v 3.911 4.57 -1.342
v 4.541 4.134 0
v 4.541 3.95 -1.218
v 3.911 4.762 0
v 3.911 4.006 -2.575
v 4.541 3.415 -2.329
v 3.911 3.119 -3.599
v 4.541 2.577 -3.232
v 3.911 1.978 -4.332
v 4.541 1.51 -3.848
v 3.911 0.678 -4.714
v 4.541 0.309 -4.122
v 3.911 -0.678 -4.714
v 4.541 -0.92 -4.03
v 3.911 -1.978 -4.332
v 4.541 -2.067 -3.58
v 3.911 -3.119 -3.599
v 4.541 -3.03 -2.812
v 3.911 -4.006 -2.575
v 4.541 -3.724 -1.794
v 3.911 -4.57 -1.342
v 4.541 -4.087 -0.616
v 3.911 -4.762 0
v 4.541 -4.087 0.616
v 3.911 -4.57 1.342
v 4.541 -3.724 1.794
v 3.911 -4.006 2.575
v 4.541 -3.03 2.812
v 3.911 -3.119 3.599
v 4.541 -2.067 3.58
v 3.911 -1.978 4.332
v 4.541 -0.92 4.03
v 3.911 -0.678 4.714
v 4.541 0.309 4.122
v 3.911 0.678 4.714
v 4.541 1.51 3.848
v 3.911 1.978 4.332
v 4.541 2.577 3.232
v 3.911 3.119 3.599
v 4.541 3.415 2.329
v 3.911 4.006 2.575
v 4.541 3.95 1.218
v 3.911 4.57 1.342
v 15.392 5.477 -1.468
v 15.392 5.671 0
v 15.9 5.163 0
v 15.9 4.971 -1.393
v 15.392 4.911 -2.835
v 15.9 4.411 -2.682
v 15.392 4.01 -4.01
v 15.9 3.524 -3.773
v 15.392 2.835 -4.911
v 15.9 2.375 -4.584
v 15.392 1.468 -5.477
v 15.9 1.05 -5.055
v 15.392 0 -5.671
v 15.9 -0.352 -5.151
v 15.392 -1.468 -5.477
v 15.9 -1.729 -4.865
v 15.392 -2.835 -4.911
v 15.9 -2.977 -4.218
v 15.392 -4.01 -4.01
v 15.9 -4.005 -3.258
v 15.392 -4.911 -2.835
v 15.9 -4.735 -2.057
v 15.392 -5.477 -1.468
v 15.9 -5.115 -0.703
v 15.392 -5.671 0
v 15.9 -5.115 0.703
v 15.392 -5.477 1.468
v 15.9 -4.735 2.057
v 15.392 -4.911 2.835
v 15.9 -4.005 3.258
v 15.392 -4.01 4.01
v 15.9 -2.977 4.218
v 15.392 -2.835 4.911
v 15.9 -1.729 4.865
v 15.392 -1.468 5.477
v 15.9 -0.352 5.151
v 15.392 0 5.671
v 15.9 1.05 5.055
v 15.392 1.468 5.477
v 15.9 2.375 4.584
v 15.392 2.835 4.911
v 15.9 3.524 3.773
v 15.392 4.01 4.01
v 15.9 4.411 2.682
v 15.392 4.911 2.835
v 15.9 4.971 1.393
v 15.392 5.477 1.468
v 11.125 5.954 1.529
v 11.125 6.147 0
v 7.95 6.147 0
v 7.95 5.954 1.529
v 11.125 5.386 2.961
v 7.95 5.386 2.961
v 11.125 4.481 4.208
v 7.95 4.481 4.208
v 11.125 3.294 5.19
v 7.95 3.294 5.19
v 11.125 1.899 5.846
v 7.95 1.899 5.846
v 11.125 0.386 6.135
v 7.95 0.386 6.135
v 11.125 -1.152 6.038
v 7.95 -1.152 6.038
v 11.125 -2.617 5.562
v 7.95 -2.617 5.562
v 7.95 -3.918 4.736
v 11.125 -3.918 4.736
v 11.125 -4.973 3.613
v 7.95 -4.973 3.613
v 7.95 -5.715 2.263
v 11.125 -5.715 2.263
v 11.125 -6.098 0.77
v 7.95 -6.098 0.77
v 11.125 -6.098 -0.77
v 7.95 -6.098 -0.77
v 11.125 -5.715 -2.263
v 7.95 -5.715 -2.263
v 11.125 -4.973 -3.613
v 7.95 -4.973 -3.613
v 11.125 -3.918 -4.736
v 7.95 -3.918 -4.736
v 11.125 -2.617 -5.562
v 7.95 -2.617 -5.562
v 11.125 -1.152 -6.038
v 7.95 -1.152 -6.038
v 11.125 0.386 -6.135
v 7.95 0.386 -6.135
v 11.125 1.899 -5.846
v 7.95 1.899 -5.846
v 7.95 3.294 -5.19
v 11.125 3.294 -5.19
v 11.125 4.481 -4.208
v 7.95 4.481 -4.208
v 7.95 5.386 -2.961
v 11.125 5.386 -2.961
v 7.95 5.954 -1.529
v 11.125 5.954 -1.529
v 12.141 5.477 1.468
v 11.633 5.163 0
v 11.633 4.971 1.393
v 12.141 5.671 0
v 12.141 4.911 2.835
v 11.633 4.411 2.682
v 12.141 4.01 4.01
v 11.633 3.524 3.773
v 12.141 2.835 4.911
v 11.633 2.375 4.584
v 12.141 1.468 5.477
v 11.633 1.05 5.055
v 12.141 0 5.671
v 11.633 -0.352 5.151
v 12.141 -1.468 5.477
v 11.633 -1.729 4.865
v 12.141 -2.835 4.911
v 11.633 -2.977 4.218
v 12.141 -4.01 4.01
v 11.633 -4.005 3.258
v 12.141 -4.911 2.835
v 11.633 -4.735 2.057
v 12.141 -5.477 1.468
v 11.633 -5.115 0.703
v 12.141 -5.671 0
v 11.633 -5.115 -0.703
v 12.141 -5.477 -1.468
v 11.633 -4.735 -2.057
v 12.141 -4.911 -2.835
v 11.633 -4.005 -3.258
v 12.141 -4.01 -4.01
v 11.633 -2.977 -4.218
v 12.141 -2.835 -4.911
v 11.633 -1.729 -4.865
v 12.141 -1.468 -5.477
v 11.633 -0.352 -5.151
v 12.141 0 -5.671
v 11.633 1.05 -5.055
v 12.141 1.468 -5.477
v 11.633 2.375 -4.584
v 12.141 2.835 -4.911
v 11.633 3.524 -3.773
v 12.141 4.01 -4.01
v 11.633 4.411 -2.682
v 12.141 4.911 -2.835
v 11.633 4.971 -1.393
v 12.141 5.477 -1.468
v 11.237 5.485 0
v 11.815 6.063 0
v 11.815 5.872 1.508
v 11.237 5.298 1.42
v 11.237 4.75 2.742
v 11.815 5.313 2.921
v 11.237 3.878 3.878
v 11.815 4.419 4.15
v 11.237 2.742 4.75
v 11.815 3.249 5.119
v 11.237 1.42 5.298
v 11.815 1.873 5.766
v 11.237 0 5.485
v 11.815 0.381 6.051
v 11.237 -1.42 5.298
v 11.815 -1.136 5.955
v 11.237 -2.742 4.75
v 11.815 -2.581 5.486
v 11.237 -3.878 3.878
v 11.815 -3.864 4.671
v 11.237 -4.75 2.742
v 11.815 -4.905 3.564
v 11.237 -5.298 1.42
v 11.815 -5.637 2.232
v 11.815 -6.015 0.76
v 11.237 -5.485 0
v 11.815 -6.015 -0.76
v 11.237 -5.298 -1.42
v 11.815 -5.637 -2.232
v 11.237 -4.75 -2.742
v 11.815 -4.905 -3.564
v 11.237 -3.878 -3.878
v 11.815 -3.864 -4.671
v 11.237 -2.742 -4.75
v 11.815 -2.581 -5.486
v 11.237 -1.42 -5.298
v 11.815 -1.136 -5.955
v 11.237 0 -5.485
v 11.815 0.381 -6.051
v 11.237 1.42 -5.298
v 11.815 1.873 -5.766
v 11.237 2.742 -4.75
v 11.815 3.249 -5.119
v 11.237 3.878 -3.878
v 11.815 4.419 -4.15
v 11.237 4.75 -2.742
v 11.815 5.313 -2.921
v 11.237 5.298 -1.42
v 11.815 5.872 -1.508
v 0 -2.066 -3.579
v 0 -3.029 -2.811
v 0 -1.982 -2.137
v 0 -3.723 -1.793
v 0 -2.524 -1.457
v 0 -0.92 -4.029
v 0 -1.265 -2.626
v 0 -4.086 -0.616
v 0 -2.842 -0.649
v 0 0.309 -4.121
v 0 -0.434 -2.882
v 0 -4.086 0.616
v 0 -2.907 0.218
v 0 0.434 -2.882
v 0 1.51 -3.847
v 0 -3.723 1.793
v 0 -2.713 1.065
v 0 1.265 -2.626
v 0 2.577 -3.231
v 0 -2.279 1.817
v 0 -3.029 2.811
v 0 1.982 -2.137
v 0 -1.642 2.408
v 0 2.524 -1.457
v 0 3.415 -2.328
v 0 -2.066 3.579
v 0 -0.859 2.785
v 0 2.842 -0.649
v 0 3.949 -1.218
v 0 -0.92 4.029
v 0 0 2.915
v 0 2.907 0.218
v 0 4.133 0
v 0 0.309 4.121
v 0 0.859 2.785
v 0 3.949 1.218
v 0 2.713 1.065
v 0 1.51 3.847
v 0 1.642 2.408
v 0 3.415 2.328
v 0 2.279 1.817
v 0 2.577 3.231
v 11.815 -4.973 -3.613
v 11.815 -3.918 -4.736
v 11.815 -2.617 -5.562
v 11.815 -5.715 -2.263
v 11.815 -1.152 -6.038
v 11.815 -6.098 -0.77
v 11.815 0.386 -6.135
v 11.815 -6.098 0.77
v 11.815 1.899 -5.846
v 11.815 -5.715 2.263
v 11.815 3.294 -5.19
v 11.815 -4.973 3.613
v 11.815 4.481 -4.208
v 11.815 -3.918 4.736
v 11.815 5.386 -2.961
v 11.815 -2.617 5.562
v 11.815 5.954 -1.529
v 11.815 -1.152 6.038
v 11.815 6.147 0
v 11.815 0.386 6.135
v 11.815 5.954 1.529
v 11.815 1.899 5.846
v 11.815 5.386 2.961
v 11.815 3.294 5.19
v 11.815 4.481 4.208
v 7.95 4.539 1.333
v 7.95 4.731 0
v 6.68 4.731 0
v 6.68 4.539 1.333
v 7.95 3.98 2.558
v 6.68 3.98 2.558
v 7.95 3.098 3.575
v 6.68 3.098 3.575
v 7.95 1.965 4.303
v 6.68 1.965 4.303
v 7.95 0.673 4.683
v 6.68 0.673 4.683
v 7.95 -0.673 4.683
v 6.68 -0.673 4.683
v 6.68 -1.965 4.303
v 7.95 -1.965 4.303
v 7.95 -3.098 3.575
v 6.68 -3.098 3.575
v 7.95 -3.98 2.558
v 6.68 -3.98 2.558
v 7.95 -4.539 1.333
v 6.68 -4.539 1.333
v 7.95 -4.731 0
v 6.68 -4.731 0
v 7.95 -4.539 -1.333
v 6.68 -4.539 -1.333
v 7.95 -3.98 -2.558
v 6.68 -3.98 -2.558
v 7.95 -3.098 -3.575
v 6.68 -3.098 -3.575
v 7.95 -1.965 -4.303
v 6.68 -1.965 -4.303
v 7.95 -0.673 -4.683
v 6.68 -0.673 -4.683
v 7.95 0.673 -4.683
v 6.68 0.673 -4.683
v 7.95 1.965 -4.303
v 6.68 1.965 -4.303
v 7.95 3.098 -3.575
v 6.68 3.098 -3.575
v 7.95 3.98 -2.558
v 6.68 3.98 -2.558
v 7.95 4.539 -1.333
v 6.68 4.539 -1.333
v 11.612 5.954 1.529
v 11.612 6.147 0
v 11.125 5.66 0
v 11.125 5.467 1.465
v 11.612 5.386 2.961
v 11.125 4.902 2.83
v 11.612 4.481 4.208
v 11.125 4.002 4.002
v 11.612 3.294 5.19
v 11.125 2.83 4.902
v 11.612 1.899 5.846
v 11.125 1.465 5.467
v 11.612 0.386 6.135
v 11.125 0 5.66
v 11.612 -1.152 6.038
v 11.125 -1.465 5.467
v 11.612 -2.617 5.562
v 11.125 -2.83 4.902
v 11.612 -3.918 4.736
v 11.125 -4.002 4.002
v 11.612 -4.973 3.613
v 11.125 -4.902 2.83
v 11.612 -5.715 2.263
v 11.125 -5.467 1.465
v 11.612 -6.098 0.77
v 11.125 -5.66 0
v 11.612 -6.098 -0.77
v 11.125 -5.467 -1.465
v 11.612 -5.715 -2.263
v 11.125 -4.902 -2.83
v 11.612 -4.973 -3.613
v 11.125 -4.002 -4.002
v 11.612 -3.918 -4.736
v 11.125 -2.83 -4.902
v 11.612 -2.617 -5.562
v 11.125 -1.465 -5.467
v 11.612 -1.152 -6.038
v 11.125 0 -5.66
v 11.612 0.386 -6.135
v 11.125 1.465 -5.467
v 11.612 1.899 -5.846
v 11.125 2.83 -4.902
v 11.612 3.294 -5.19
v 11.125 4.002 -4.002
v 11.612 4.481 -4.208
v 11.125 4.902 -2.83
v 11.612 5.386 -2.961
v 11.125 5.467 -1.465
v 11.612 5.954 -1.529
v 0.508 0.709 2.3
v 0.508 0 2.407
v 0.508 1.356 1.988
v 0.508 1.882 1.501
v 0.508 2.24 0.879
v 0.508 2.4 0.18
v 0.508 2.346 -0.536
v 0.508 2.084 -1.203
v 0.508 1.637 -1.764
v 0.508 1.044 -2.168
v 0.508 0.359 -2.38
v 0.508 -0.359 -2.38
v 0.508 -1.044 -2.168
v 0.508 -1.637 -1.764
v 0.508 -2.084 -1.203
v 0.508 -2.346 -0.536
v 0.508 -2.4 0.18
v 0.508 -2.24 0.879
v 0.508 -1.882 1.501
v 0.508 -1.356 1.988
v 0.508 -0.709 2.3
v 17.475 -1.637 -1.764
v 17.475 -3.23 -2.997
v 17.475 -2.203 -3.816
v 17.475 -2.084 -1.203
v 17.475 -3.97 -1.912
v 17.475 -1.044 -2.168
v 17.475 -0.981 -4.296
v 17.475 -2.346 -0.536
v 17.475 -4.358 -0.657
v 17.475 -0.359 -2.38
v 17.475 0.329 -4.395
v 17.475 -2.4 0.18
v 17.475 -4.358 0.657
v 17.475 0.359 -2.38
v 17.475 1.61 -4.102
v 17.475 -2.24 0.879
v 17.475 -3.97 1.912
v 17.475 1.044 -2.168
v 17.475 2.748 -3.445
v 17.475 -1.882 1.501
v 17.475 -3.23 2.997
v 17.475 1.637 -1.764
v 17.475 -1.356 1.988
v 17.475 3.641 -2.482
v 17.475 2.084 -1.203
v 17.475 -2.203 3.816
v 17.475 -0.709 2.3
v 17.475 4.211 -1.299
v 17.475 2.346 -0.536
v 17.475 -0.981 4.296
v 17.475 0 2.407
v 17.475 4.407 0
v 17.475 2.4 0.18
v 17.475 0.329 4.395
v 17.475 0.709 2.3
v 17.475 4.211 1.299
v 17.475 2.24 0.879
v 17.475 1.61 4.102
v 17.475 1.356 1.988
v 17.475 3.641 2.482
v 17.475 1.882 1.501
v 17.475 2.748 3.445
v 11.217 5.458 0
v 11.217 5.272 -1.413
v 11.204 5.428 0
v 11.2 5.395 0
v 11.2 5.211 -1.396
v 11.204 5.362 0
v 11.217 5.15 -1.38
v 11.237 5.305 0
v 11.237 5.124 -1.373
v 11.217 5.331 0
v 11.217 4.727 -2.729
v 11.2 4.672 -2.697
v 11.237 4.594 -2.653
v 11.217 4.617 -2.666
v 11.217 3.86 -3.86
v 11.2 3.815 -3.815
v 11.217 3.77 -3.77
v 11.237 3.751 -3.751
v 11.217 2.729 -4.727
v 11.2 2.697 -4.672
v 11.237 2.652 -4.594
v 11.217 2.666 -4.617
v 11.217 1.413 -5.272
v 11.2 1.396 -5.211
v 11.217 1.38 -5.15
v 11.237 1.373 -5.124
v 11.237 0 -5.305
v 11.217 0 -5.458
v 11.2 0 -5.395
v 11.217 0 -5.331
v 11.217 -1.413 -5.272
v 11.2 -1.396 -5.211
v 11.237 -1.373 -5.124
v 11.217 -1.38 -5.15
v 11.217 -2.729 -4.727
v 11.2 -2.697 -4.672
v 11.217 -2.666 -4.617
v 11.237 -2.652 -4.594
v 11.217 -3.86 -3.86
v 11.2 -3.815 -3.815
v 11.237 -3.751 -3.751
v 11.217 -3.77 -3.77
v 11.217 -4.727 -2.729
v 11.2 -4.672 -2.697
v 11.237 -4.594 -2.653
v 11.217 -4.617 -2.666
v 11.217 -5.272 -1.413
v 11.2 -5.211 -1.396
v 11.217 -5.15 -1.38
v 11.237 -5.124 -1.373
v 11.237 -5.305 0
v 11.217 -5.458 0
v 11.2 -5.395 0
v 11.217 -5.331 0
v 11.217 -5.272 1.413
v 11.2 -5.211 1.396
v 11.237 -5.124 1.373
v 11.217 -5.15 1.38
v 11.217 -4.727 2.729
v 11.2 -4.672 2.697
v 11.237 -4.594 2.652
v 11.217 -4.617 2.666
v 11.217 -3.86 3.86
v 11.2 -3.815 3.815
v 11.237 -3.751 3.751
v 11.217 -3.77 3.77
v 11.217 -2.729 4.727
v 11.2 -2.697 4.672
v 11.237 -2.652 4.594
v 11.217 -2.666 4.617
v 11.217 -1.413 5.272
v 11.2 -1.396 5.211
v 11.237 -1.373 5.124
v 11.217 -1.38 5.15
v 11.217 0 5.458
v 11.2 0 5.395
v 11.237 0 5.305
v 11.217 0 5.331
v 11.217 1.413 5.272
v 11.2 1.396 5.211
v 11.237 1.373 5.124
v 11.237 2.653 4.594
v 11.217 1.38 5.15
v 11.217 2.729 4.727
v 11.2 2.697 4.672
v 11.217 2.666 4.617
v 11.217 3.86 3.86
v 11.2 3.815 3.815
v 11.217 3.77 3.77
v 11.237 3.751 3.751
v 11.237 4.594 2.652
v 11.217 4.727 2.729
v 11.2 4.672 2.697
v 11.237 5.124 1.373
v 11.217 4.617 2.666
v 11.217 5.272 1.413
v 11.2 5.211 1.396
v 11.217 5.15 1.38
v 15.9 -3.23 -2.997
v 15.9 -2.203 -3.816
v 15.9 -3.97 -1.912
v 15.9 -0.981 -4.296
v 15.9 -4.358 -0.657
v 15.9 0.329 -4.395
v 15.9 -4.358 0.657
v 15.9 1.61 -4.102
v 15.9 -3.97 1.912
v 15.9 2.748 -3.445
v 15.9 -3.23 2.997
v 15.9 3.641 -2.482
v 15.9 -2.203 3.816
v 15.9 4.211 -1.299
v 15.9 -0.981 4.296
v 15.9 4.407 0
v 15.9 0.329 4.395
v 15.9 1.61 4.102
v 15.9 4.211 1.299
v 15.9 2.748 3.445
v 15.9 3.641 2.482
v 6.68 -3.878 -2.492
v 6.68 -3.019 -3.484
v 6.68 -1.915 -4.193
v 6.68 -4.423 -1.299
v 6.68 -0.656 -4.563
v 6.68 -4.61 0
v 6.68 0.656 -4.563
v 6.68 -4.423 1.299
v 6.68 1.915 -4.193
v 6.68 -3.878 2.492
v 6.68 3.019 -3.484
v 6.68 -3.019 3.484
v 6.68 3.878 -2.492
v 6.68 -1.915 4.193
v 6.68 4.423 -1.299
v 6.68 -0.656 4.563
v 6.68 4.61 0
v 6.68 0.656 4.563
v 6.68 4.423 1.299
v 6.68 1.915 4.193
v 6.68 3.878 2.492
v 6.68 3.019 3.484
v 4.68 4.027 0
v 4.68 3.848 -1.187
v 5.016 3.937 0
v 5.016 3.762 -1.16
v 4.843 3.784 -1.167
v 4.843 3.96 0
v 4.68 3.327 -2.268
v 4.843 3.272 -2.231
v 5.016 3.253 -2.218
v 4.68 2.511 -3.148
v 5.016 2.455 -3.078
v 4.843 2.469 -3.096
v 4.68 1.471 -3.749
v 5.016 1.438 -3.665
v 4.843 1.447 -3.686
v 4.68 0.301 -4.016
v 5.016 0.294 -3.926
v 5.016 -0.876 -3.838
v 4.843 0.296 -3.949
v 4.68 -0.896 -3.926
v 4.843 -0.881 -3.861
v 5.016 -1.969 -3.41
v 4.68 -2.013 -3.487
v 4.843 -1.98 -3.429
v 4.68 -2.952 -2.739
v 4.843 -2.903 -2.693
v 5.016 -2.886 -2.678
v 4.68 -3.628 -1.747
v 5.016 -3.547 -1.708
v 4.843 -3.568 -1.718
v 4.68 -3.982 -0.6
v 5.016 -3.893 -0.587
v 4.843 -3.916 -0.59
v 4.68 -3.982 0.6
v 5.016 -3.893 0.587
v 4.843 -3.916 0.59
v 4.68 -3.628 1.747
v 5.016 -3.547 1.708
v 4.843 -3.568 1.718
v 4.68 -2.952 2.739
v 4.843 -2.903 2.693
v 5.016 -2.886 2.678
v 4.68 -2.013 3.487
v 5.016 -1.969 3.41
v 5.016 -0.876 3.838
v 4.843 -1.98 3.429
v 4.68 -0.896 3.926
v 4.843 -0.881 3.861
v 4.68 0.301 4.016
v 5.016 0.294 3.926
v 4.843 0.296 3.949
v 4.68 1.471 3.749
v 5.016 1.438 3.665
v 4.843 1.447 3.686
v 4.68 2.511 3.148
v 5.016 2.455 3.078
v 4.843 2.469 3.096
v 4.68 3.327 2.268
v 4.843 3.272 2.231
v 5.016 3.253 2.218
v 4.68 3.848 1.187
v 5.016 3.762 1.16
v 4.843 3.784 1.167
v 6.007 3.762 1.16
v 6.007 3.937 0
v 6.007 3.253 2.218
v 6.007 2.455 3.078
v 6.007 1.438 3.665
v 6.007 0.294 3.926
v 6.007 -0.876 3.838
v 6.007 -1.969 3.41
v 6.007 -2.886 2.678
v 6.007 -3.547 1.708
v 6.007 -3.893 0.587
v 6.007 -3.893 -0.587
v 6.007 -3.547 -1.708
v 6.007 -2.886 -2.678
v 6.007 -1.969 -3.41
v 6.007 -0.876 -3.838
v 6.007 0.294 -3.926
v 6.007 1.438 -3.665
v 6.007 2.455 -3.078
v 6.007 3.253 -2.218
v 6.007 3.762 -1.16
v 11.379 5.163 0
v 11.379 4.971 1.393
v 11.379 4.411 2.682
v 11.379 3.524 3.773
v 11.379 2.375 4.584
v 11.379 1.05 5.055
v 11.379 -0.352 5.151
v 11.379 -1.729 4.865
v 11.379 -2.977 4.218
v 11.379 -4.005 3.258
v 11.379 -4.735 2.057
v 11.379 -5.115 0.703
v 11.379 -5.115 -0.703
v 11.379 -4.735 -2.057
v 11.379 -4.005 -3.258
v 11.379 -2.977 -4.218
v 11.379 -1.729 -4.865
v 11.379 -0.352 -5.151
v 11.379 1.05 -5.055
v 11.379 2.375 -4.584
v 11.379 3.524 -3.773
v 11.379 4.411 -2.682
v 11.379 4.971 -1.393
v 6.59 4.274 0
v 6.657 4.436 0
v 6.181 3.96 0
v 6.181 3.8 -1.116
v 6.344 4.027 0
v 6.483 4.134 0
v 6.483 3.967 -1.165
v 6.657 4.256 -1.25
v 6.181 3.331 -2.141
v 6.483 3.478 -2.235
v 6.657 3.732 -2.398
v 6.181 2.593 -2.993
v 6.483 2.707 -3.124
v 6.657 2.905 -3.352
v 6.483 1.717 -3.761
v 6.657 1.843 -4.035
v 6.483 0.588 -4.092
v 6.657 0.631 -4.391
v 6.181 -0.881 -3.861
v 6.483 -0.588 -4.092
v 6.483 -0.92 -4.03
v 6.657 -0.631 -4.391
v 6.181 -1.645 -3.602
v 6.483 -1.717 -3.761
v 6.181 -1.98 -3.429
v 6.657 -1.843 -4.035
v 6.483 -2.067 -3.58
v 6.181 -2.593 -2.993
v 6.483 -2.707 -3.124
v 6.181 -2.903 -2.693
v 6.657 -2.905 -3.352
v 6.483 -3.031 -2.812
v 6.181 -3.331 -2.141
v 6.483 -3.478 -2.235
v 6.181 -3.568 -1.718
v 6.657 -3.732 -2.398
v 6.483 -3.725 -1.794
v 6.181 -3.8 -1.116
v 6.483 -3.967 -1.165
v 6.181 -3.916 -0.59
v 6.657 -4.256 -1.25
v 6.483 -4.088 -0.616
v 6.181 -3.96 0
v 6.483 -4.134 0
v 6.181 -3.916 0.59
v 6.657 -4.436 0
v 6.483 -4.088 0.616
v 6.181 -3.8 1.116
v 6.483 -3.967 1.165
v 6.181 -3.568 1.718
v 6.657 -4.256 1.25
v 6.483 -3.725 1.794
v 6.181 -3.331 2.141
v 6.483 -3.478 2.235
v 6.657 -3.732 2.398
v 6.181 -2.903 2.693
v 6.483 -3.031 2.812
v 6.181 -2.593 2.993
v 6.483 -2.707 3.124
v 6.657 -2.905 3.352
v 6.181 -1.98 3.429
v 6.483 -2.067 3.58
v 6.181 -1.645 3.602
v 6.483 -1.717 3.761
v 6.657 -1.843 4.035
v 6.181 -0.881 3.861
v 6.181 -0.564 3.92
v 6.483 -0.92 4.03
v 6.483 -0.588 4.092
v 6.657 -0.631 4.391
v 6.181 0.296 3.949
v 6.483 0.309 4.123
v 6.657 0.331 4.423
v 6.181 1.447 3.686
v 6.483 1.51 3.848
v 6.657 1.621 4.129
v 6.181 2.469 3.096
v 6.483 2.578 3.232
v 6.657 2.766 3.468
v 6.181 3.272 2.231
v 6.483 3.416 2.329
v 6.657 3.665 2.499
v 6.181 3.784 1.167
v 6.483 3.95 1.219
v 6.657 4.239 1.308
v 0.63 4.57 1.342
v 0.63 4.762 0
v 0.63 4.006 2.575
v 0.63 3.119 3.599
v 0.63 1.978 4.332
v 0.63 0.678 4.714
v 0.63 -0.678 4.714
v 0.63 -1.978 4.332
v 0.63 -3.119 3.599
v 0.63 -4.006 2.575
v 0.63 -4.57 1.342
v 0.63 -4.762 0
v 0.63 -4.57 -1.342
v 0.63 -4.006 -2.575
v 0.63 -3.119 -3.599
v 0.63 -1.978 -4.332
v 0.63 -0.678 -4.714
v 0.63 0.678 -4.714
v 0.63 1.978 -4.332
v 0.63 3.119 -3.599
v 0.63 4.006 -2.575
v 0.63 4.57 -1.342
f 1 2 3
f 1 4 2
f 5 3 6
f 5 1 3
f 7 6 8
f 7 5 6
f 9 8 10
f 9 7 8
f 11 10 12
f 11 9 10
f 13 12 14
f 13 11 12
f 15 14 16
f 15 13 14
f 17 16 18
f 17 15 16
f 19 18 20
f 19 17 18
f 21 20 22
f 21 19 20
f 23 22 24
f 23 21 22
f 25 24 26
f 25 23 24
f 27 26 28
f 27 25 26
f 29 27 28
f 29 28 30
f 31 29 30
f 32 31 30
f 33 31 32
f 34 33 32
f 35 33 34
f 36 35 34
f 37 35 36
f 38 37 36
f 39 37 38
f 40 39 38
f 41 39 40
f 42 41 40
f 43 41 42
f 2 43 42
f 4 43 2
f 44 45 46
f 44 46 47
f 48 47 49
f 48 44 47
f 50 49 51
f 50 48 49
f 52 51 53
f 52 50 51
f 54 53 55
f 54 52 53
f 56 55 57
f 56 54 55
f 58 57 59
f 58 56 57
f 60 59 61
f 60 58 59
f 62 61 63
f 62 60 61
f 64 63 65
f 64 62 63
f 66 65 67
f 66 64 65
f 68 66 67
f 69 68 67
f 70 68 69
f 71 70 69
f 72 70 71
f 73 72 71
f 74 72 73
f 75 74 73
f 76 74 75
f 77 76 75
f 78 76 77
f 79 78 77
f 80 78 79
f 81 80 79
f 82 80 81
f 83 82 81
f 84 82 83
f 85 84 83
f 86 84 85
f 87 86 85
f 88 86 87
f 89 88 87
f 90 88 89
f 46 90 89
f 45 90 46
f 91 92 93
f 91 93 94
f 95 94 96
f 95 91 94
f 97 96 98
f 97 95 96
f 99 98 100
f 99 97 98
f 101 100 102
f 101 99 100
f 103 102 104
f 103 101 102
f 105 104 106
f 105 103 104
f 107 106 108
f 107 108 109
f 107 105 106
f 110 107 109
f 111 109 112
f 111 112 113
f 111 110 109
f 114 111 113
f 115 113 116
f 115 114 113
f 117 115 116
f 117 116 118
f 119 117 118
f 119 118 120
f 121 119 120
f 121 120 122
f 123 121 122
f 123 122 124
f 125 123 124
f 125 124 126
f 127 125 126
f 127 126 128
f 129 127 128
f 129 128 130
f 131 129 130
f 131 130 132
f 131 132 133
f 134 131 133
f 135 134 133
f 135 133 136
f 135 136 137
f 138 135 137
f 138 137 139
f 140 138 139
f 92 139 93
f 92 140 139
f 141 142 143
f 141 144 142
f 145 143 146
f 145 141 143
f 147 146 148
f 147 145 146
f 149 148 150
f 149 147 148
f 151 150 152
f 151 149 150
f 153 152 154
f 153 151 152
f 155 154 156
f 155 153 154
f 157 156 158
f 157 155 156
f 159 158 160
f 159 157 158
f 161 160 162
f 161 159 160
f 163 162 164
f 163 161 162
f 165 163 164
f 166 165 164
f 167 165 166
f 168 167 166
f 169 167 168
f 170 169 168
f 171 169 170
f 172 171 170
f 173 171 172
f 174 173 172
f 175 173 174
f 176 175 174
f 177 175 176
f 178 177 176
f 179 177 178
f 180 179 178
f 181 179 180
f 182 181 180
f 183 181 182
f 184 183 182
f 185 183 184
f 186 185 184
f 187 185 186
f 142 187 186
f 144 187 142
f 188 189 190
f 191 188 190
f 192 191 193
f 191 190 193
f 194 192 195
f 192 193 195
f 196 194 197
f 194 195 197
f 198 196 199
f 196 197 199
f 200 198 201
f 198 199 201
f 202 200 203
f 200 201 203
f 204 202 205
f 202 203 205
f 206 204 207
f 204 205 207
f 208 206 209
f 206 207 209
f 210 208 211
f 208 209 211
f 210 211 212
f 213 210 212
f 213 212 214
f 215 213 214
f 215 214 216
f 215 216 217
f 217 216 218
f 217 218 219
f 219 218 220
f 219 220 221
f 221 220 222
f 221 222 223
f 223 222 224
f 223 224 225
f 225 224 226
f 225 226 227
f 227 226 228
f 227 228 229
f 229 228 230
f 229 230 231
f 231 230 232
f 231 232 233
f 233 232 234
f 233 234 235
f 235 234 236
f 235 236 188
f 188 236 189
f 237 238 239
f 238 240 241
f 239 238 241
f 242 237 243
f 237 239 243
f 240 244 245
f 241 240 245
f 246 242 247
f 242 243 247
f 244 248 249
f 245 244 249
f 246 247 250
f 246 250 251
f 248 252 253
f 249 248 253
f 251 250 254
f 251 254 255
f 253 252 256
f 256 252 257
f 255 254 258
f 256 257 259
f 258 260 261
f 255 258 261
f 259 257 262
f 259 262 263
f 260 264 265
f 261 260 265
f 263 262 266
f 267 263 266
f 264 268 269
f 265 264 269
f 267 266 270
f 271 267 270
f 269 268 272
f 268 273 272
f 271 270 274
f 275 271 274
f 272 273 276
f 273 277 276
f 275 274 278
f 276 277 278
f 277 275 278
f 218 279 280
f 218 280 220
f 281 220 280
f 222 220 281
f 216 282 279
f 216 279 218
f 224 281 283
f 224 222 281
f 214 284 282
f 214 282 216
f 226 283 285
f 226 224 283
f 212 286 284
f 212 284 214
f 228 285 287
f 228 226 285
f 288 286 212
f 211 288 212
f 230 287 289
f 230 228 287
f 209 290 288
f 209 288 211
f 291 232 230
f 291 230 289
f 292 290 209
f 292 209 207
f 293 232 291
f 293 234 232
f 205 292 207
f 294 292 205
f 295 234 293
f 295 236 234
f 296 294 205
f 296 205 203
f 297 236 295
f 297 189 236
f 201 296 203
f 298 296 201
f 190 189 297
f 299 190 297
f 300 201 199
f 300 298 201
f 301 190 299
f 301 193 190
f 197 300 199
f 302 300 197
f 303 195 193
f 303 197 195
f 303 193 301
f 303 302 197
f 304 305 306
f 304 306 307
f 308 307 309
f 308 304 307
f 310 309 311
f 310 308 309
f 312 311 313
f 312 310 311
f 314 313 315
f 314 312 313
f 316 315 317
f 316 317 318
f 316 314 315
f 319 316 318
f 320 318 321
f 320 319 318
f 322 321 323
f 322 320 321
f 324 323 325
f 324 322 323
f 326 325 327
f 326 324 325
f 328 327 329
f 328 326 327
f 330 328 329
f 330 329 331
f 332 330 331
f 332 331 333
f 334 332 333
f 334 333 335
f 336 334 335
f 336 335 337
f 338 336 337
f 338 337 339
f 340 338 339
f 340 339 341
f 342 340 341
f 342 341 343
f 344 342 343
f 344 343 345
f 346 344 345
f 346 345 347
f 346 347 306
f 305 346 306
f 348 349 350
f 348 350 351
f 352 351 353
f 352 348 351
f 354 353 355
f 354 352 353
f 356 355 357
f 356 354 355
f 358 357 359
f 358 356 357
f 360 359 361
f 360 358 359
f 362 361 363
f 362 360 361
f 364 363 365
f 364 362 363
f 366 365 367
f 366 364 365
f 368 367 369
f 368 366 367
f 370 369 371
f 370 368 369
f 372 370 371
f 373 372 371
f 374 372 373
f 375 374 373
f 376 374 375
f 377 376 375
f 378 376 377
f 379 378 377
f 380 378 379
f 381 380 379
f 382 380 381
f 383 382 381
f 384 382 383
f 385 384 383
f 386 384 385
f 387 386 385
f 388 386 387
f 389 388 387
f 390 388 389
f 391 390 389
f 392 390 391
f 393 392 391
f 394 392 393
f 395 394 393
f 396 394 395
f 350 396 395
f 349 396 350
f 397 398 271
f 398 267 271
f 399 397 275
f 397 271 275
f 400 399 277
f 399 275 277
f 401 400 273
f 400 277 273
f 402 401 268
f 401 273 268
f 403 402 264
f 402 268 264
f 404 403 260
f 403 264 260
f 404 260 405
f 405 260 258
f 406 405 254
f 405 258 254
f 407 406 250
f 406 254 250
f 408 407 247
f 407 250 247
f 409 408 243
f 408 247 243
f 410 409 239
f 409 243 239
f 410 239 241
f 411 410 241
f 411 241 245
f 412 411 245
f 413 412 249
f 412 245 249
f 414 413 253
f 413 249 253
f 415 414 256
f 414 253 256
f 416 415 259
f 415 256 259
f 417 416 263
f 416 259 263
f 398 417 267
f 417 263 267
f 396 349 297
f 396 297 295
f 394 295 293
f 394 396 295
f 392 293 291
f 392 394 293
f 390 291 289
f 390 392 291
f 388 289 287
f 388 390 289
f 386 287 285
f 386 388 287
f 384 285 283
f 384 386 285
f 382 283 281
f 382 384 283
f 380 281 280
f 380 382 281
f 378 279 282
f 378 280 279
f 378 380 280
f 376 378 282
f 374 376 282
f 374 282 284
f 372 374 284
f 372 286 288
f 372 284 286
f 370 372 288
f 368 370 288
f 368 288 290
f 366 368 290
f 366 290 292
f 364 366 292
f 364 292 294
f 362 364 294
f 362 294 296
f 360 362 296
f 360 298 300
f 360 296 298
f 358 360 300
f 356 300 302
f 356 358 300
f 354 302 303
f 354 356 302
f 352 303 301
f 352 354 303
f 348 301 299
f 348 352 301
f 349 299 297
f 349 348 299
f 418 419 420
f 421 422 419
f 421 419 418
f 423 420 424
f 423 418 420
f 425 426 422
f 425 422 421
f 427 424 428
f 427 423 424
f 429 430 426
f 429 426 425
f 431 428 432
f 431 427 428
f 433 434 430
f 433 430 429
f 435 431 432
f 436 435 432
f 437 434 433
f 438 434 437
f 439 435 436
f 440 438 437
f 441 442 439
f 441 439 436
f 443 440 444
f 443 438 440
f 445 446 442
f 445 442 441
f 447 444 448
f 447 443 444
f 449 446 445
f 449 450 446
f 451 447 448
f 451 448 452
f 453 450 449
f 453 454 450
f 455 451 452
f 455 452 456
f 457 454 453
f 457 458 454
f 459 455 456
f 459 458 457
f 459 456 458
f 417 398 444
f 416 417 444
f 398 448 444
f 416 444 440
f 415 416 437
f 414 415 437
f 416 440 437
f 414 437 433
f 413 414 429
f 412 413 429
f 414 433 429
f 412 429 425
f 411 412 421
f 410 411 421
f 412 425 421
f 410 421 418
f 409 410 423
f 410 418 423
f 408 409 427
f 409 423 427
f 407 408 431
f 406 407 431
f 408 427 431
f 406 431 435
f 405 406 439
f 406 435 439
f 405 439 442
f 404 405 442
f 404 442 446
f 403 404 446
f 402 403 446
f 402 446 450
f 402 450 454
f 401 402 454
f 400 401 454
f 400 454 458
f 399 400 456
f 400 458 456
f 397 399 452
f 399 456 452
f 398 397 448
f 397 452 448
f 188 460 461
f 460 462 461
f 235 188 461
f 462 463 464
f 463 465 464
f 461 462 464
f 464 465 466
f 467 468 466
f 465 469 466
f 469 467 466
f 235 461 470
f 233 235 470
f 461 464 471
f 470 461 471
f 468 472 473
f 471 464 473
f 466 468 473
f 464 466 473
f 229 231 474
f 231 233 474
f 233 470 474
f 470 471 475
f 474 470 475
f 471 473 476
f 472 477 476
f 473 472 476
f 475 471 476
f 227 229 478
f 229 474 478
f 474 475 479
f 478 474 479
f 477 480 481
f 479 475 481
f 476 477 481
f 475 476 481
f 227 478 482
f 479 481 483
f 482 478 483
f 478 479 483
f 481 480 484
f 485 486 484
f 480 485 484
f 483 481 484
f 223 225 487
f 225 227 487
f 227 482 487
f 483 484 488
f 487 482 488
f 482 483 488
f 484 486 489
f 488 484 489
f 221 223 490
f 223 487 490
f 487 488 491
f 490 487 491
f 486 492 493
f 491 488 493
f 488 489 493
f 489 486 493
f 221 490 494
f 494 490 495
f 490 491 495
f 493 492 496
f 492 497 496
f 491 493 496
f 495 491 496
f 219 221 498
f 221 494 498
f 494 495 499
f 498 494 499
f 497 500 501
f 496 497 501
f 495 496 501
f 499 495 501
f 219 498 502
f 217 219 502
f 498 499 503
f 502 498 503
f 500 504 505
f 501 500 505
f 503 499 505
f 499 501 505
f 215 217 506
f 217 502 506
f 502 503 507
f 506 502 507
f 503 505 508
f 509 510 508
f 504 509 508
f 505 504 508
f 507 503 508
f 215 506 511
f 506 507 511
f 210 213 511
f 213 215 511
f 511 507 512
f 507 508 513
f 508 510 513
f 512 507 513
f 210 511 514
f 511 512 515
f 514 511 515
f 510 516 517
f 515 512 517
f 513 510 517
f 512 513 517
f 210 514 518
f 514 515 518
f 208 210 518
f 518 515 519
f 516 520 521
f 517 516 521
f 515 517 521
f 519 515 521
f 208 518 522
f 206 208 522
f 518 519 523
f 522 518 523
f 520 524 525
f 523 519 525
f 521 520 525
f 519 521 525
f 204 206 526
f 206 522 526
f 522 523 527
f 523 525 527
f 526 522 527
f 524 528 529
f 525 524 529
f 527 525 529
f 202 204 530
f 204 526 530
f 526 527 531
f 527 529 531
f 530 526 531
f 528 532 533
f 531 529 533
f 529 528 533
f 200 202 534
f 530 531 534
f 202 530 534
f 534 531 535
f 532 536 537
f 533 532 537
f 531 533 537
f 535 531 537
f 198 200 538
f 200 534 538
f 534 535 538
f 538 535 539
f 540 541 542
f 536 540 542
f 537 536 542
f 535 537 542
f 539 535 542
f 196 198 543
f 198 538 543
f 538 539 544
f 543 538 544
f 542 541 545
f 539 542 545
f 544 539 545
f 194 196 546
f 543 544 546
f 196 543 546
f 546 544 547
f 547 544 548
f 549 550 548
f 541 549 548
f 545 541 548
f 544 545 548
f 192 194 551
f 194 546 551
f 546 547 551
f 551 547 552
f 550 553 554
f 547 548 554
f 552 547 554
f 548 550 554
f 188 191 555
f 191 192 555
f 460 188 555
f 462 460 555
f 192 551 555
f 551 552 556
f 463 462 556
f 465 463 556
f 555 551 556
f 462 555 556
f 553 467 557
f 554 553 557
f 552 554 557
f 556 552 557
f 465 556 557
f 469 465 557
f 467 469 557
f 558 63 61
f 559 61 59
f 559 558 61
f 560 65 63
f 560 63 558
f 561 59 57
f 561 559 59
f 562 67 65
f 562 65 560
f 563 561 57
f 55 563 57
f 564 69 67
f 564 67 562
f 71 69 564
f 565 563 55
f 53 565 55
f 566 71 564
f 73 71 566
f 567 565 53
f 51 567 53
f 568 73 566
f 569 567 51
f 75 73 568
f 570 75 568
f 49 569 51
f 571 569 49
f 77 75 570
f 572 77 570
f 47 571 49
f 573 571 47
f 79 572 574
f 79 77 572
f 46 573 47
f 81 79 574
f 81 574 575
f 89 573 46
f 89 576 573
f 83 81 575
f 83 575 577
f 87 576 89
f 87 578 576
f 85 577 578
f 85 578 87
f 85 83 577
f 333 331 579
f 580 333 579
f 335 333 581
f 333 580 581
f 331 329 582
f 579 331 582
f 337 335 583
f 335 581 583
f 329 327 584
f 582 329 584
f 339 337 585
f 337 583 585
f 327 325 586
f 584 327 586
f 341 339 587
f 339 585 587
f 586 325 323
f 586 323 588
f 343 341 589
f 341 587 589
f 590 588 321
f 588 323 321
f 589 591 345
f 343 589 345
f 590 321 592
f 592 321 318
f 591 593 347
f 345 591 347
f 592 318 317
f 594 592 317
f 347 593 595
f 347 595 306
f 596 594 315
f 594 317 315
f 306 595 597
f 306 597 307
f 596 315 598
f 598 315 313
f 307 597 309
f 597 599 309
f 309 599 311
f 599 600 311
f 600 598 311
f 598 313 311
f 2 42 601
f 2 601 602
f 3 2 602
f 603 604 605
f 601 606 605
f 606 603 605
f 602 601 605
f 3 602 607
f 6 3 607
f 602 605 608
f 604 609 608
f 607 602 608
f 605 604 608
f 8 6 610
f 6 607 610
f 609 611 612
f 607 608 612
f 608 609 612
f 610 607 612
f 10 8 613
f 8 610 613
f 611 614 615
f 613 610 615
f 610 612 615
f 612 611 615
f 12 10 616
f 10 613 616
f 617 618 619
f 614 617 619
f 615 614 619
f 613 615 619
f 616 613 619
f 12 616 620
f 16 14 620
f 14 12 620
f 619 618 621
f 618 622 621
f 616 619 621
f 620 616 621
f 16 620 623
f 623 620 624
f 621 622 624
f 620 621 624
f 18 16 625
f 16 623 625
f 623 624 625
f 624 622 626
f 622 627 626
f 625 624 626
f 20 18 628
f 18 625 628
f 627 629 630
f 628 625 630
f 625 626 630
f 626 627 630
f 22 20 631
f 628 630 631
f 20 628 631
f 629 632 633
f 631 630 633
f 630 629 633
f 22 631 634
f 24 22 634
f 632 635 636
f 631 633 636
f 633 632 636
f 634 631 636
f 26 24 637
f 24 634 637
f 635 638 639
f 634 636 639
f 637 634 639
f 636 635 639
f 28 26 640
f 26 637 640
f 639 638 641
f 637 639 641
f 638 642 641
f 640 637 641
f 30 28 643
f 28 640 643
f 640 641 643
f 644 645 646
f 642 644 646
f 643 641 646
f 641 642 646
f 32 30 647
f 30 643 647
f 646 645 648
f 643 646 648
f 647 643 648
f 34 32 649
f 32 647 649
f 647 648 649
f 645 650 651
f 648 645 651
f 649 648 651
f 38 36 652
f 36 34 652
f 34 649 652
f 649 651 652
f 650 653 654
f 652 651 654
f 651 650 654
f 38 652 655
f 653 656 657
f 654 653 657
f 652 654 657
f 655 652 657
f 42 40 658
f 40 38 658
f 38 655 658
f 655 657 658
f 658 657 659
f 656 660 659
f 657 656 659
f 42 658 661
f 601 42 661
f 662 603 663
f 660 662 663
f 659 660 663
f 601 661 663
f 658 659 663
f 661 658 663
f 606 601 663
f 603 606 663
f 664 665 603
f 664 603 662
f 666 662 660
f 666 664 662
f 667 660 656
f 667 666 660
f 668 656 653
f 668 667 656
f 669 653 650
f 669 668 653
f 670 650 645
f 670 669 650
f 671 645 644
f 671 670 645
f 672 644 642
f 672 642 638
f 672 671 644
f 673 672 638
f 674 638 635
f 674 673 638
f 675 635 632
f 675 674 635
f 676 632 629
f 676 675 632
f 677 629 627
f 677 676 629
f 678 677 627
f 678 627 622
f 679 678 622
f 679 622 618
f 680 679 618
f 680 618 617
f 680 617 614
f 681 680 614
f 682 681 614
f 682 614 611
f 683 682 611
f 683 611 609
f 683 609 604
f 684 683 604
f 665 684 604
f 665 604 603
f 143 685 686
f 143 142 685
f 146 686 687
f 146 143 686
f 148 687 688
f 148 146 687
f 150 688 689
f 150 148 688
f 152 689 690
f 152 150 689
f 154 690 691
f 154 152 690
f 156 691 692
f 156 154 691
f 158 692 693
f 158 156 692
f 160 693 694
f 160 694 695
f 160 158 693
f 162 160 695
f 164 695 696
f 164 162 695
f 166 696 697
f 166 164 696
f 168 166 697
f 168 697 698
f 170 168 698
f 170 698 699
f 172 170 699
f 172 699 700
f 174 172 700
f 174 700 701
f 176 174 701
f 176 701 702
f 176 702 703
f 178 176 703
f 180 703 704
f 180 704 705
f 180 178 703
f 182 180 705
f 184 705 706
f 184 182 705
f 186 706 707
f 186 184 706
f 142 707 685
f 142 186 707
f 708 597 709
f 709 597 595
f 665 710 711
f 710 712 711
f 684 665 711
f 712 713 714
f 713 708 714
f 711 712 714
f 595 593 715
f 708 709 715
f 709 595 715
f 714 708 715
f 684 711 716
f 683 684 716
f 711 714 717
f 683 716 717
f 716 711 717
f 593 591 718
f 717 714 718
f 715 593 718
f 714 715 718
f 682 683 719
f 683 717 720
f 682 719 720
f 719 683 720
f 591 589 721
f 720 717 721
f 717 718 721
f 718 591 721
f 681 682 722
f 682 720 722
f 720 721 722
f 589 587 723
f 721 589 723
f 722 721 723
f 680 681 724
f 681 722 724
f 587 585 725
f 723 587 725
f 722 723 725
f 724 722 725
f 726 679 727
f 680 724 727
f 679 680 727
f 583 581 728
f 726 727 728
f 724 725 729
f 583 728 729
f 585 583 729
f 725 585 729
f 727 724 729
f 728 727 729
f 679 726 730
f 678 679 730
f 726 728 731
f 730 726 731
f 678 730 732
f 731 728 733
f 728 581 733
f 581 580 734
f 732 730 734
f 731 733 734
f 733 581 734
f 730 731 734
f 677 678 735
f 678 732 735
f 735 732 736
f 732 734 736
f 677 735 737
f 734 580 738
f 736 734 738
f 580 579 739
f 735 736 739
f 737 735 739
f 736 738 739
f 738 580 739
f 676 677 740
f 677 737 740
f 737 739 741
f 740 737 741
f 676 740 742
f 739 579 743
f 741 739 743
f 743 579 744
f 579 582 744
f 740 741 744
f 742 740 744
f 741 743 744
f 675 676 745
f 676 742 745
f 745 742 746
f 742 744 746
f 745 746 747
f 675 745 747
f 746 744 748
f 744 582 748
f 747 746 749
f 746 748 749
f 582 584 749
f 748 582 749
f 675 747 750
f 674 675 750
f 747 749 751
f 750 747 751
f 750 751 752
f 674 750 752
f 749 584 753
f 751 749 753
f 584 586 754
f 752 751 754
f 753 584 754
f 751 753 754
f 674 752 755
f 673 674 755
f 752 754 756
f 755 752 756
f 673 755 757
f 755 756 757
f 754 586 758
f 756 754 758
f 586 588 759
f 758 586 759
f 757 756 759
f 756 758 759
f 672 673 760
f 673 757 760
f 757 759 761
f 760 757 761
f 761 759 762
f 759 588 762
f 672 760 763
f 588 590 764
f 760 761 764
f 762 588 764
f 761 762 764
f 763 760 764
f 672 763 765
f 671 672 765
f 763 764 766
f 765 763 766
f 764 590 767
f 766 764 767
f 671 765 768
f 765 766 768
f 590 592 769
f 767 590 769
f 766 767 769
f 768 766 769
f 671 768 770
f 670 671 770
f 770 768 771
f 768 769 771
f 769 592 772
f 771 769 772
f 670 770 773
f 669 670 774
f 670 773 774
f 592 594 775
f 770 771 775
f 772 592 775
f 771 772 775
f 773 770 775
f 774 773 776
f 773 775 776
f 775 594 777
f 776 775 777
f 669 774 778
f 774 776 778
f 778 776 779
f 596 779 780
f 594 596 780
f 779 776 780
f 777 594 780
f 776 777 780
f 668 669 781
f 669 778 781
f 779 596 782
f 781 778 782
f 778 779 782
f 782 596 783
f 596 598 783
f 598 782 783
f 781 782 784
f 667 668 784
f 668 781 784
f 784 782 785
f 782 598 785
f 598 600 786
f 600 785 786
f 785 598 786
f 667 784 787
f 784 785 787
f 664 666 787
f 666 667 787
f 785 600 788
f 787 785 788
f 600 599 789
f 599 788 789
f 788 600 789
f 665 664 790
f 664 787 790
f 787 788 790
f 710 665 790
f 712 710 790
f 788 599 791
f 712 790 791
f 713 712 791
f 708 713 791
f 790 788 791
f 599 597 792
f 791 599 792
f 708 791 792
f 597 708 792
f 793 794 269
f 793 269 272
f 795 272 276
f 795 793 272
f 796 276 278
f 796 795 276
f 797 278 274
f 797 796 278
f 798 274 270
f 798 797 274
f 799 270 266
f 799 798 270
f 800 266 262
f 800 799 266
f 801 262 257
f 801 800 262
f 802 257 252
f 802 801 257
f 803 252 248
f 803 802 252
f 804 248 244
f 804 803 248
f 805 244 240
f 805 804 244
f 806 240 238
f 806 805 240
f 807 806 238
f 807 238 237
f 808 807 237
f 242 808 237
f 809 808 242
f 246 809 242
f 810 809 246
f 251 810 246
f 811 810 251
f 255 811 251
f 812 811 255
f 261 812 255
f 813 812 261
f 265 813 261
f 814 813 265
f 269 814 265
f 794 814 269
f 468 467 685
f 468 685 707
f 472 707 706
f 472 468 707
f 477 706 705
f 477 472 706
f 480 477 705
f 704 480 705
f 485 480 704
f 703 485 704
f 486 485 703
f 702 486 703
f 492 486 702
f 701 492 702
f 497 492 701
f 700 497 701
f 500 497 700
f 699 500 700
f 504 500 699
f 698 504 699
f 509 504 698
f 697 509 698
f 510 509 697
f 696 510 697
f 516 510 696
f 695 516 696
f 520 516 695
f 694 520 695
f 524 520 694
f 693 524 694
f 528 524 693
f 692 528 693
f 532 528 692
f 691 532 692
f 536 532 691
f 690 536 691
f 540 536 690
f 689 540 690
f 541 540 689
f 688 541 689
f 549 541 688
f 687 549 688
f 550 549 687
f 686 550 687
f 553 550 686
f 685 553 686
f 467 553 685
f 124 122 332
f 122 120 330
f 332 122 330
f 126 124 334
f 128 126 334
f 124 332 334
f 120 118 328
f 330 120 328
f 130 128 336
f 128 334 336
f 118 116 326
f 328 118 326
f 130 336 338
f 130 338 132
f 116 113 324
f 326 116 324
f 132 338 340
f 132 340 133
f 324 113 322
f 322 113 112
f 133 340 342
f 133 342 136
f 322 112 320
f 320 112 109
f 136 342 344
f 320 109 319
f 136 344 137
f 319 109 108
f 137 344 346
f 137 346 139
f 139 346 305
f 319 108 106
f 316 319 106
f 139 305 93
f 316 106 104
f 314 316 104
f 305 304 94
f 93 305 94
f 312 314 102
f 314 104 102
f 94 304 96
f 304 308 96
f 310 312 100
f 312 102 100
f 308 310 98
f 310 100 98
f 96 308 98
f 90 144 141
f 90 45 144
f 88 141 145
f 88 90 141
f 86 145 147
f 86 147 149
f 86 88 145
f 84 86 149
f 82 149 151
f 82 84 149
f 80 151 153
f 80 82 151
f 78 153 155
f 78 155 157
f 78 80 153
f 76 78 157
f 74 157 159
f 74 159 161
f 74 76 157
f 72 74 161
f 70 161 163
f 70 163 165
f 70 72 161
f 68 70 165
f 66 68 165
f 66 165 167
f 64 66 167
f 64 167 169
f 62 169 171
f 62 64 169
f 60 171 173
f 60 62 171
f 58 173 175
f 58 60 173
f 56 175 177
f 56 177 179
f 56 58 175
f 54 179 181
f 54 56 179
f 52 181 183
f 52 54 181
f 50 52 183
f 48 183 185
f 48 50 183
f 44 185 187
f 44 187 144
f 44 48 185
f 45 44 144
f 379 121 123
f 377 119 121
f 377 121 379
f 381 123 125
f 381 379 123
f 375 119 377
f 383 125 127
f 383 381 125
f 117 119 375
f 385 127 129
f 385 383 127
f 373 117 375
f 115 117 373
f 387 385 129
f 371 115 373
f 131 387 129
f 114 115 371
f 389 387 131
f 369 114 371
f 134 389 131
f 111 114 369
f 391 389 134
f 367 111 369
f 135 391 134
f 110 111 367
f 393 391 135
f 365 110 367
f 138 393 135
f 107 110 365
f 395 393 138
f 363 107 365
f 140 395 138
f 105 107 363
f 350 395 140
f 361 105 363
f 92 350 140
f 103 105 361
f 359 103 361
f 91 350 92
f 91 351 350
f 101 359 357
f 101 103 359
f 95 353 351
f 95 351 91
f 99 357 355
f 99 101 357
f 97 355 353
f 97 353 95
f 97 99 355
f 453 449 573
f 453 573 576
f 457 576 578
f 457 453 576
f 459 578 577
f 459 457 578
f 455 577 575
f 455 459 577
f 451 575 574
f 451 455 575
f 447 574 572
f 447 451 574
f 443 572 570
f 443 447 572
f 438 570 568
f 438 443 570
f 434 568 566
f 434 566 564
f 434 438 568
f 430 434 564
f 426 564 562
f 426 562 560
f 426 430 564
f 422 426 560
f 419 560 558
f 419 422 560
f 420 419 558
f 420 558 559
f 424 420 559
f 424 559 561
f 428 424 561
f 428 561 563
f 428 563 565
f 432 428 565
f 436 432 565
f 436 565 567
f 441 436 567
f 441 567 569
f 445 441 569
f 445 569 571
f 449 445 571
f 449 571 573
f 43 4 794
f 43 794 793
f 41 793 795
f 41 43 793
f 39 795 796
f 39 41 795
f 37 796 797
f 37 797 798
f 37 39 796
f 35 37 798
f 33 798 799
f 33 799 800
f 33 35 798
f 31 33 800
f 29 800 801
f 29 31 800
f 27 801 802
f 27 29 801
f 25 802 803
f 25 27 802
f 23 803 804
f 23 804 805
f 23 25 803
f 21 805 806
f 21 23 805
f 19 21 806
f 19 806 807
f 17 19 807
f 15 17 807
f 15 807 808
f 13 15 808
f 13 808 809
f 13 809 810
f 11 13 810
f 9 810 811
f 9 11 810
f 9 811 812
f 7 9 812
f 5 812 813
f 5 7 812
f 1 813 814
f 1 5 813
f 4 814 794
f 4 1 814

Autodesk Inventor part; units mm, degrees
sketch "Sketch_2" plane through (0, 0, 0) normal (0, 0, 1) x (1, 0, 0)
  line L0 (7.9502, 0) -> (0, 0)
  line L1 (0, 0) -> (0, 4.1326)
  line L2 (0, 4.1326) -> (0.6299, 4.7625)
  line L3 (0.6299, 4.7625) -> (3.9106, 4.7625)
  line L4 (3.9106, 4.7625) -> (4.5411, 4.1336)
  arc A0 (4.5411, 4.1336) -> (5.0165, 3.937) centre (5.0165, 4.6101) ccw
  line L5 (5.0165, 3.937) -> (6.0071, 3.937)
  arc A1 (6.0071, 3.937) -> (6.6802, 4.6101) centre (6.0071, 4.6101) ccw
  line L6 (6.6802, 4.6101) -> (6.6802, 4.7307)
  line L7 (6.6802, 4.7307) -> (7.9502, 4.7307)
  line L8 (7.9502, 4.7307) -> (7.9502, 0)
  line L9 (7.9502, 0) -> (0, 0)
revolve "Revolution1" add sketch "Sketch_2" angle 360 about axis through (7.9502, 0, 0) along (1, 0, 0)
thread "Thread1" size "3/8-24 UNF" class "2A" standard "ANSI Unified Screw Threads" full length
sketch "Sketch_3" plane through (0, 0, 0) normal (0, 0, 1) x (1, 0, 0)
  line L0 (15.9004, 0) -> (7.9502, 0)
  line L1 (7.9502, 0) -> (7.9502, 6.1468)
  line L2 (7.9502, 6.1468) -> (11.1252, 6.1468)
  line L3 (11.1252, 6.1468) -> (11.1252, 5.1626)
  line L4 (11.1252, 5.1626) -> (11.6332, 5.1626)
  line L5 (11.6332, 5.1626) -> (12.1412, 5.6706)
  line L6 (12.1412, 5.6706) -> (15.3924, 5.6706)
  line L7 (15.3924, 5.6706) -> (15.9004, 5.1626)
  line L8 (15.9004, 5.1626) -> (15.9004, 0)
  line L9 (15.9004, 0) -> (7.9502, 0)
revolve "Revolution2" add sketch "Sketch_3" angle 360 about axis through (15.9004, 0, 0) along (1, 0, 0)
sketch "Sketch_4" plane through (0, 0, 0) normal (0, 0, 1) x (1, 0, 0)
  line L0 (17.4752, 0) -> (15.9004, 0)
  line L1 (15.9004, 0) -> (15.9004, 4.4069)
  line L2 (15.9004, 4.4069) -> (17.4752, 4.4069)
  line L3 (17.4752, 4.4069) -> (17.4752, 0)
  line L4 (17.4752, 0) -> (15.9004, 0)
revolve "Revolution3" add sketch "Sketch_4" angle 360 about axis through (17.4752, 0, 0) along (1, 0, 0)
sketch "Sketch4" plane through (0, 0, 0) normal (-1, 0, 0) x (0, 0, 1)
  point P0 (0, 0)
hole "Hole1" at (0, 0, 0) direction (1, 0, 0) diameter 4.8133 depth 17.4752 countersink diameter 5.8293 countersink angle 90
sketch "Sketch_47" plane through (0, 0, 0) normal (0, 0, 1) x (1, 0, 0)
  line L0 (11.6332, 0) -> (11.1252, 0)
  line L1 (11.1252, 5.6603) -> (11.1252, 4.9085)
  line L2 (11.1252, 4.9085) -> (11.6332, 4.9085)
  line L3 (11.6332, 4.9085) -> (11.6332, 5.1626)
  line L4 (11.6332, 5.1626) -> (11.3792, 5.1626)
  line L5 (11.3792, 5.1626) -> (11.2368, 5.305)
  arc A0 (11.2368, 5.4846) -> (11.2368, 5.305) centre (11.3266, 5.3948) ccw
  line L6 (11.2368, 5.4846) -> (11.8149, 6.0626)
  line L7 (11.8149, 6.0626) -> (11.8149, 6.1468)
  line L8 (11.8149, 6.1468) -> (11.6117, 6.1468)
  line L9 (11.6117, 6.1468) -> (11.1252, 5.6603)
revolve "Revolution4" add sketch "Sketch_47" angle 360 about axis through (11.6332, 0, 0) along (1, 0, 0)
ref_plane "dp1_XY" through (7.9502, 4.7307, 0) normal (0, 0, 1) x (1, 0, 0)
ref_plane "dp1_YZ" through (7.9502, 4.7307, 0) normal (1, 0, 0) x (0, 1, 0)
ref_plane "dp1_ZX" through (7.9502, 4.7307, 0) normal (0, 1, 0) x (0, 0, 1)
ref_plane "dp2_XY" through (7.9502, -4.7307, 0) normal (0, 0, 1) x (1, 0, 0)
ref_plane "dp2_YZ" through (7.9502, -4.7307, 0) normal (1, 0, 0) x (0, 1, 0)
ref_plane "dp2_ZX" through (7.9502, -4.7307, 0) normal (0, 1, 0) x (0, 0, 1)
ref_plane "hh_XY" through (0, 4.7625, 0) normal (0, 0, 1) x (1, 0, 0)
ref_plane "hh_YZ" through (0, 4.7625, 0) normal (1, 0, 0) x (0, 1, 0)
ref_plane "hh_ZX" through (0, 4.7625, 0) normal (0, 1, 0) x (0, 0, 1)
ref_plane "rod_guide_XY" through (0, 0, 0) normal (1, 0, 0) x (0, 0, -1)
ref_plane "rod_guide_YZ" through (0, 0, 0) normal (0, 0, -1) x (0, 1, 0)
ref_plane "rod_guide_ZX" through (0, 0, 0) normal (0, 1, 0) x (1, 0, 0)
ref_plane "s1_XY" through (6.6802, 0, 0) normal (0, 0, 1) x (1, 0, 0)
ref_plane "s1_YZ" through (6.6802, 0, 0) normal (1, 0, 0) x (0, 1, 0)
ref_plane "s1_ZX" through (6.6802, 0, 0) normal (0, 1, 0) x (0, 0, 1)
ref_plane "s2_XY" through (7.9502, 0, 0) normal (0, 0, 1) x (1, 0, 0)
ref_plane "s2_YZ" through (7.9502, 0, 0) normal (1, 0, 0) x (0, 1, 0)
ref_plane "s2_ZX" through (7.9502, 0, 0) normal (0, 1, 0) x (0, 0, 1)
ref_plane "t1_XY" through (7.9502, 0, 0) normal (1, 0, 0) x (0, 0, -1)
ref_plane "t1_YZ" through (7.9502, 0, 0) normal (0, 0, -1) x (0, 1, 0)
ref_plane "t1_ZX" through (7.9502, 0, 0) normal (0, 1, 0) x (1, 0, 0)
ref_plane "t111_XY" through (7.9502, 0, 0) normal (1, 0, 0) x (0, 0, -1)
ref_plane "t111_YZ" through (7.9502, 0, 0) normal (0, 0, -1) x (0, 1, 0)
ref_plane "t111_ZX" through (7.9502, 0, 0) normal (0, 1, 0) x (1, 0, 0)
ref_plane "to_foot_bracket_XY" through (7.9502, 0, 0) normal (1, 0, 0) x (0, 0, -1)
ref_plane "to_foot_bracket_YZ" through (7.9502, 0, 0) normal (0, 0, -1) x (0, 1, 0)
ref_plane "to_foot_bracket_ZX" through (7.9502, 0, 0) normal (0, 1, 0) x (1, 0, 0)
ref_plane "to_nut_XY" through (6.6802, 0, 0) normal (1, 0, 0) x (0, 0, -1)
ref_plane "to_nut_YZ" through (6.6802, 0, 0) normal (0, 0, -1) x (0, 1, 0)
ref_plane "to_nut_ZX" through (6.6802, 0, 0) normal (0, 1, 0) x (1, 0, 0)
ref_plane "to_rod_XY" through (0, 0, 0) normal (1, 0, 0) x (0, 0, -1)
ref_plane "to_rod_YZ" through (0, 0, 0) normal (0, 0, -1) x (0, 1, 0)
ref_plane "to_rod_ZX" through (0, 0, 0) normal (0, 1, 0) x (1, 0, 0)
ref_plane "to_screw_XY" through (5.588, 0, 0) normal (0, 1, 0) x (1, 0, 0)
ref_plane "to_screw_YZ" through (5.588, 0, 0) normal (1, 0, 0) x (0, 0, -1)
ref_plane "to_screw_ZX" through (5.588, 0, 0) normal (0, 0, -1) x (0, 1, 0)
ref_plane "to_trunnion_brackets_XY" through (7.9248, 0, 0) normal (0, 1, 0) x (1, 0, 0)
ref_plane "to_trunnion_brackets_YZ" through (7.9248, 0, 0) normal (1, 0, 0) x (0, 0, -1)
ref_plane "to_trunnion_brackets_ZX" through (7.9248, 0, 0) normal (0, 0, -1) x (0, 1, 0)
ref_plane "to_trunnion_brackets1_XY" through (7.9248, 9.525, 0) normal (0, 1, 0) x (1, 0, 0)
ref_plane "to_trunnion_brackets1_YZ" through (7.9248, 9.525, 0) normal (1, 0, 0) x (0, 0, -1)
ref_plane "to_trunnion_brackets1_ZX" through (7.9248, 9.525, 0) normal (0, 0, -1) x (0, 1, 0)
ref_plane "to_trunnion_brackets2_XY" through (7.9248, -9.525, 0) normal (0, 1, 0) x (1, 0, 0)
ref_plane "to_trunnion_brackets2_YZ" through (7.9248, -9.525, 0) normal (1, 0, 0) x (0, 0, -1)
ref_plane "to_trunnion_brackets2_ZX" through (7.9248, -9.525, 0) normal (0, 0, -1) x (0, 1, 0)
ref_plane "to_tube_XY" through (11.6332, 0, 0) normal (1, 0, 0) x (0, 0, -1)
ref_plane "to_tube_YZ" through (11.6332, 0, 0) normal (0, 0, -1) x (0, 1, 0)
ref_plane "to_tube_ZX" through (11.6332, 0, 0) normal (0, 1, 0) x (1, 0, 0)
properties part number "01000-0_rod_guide"
